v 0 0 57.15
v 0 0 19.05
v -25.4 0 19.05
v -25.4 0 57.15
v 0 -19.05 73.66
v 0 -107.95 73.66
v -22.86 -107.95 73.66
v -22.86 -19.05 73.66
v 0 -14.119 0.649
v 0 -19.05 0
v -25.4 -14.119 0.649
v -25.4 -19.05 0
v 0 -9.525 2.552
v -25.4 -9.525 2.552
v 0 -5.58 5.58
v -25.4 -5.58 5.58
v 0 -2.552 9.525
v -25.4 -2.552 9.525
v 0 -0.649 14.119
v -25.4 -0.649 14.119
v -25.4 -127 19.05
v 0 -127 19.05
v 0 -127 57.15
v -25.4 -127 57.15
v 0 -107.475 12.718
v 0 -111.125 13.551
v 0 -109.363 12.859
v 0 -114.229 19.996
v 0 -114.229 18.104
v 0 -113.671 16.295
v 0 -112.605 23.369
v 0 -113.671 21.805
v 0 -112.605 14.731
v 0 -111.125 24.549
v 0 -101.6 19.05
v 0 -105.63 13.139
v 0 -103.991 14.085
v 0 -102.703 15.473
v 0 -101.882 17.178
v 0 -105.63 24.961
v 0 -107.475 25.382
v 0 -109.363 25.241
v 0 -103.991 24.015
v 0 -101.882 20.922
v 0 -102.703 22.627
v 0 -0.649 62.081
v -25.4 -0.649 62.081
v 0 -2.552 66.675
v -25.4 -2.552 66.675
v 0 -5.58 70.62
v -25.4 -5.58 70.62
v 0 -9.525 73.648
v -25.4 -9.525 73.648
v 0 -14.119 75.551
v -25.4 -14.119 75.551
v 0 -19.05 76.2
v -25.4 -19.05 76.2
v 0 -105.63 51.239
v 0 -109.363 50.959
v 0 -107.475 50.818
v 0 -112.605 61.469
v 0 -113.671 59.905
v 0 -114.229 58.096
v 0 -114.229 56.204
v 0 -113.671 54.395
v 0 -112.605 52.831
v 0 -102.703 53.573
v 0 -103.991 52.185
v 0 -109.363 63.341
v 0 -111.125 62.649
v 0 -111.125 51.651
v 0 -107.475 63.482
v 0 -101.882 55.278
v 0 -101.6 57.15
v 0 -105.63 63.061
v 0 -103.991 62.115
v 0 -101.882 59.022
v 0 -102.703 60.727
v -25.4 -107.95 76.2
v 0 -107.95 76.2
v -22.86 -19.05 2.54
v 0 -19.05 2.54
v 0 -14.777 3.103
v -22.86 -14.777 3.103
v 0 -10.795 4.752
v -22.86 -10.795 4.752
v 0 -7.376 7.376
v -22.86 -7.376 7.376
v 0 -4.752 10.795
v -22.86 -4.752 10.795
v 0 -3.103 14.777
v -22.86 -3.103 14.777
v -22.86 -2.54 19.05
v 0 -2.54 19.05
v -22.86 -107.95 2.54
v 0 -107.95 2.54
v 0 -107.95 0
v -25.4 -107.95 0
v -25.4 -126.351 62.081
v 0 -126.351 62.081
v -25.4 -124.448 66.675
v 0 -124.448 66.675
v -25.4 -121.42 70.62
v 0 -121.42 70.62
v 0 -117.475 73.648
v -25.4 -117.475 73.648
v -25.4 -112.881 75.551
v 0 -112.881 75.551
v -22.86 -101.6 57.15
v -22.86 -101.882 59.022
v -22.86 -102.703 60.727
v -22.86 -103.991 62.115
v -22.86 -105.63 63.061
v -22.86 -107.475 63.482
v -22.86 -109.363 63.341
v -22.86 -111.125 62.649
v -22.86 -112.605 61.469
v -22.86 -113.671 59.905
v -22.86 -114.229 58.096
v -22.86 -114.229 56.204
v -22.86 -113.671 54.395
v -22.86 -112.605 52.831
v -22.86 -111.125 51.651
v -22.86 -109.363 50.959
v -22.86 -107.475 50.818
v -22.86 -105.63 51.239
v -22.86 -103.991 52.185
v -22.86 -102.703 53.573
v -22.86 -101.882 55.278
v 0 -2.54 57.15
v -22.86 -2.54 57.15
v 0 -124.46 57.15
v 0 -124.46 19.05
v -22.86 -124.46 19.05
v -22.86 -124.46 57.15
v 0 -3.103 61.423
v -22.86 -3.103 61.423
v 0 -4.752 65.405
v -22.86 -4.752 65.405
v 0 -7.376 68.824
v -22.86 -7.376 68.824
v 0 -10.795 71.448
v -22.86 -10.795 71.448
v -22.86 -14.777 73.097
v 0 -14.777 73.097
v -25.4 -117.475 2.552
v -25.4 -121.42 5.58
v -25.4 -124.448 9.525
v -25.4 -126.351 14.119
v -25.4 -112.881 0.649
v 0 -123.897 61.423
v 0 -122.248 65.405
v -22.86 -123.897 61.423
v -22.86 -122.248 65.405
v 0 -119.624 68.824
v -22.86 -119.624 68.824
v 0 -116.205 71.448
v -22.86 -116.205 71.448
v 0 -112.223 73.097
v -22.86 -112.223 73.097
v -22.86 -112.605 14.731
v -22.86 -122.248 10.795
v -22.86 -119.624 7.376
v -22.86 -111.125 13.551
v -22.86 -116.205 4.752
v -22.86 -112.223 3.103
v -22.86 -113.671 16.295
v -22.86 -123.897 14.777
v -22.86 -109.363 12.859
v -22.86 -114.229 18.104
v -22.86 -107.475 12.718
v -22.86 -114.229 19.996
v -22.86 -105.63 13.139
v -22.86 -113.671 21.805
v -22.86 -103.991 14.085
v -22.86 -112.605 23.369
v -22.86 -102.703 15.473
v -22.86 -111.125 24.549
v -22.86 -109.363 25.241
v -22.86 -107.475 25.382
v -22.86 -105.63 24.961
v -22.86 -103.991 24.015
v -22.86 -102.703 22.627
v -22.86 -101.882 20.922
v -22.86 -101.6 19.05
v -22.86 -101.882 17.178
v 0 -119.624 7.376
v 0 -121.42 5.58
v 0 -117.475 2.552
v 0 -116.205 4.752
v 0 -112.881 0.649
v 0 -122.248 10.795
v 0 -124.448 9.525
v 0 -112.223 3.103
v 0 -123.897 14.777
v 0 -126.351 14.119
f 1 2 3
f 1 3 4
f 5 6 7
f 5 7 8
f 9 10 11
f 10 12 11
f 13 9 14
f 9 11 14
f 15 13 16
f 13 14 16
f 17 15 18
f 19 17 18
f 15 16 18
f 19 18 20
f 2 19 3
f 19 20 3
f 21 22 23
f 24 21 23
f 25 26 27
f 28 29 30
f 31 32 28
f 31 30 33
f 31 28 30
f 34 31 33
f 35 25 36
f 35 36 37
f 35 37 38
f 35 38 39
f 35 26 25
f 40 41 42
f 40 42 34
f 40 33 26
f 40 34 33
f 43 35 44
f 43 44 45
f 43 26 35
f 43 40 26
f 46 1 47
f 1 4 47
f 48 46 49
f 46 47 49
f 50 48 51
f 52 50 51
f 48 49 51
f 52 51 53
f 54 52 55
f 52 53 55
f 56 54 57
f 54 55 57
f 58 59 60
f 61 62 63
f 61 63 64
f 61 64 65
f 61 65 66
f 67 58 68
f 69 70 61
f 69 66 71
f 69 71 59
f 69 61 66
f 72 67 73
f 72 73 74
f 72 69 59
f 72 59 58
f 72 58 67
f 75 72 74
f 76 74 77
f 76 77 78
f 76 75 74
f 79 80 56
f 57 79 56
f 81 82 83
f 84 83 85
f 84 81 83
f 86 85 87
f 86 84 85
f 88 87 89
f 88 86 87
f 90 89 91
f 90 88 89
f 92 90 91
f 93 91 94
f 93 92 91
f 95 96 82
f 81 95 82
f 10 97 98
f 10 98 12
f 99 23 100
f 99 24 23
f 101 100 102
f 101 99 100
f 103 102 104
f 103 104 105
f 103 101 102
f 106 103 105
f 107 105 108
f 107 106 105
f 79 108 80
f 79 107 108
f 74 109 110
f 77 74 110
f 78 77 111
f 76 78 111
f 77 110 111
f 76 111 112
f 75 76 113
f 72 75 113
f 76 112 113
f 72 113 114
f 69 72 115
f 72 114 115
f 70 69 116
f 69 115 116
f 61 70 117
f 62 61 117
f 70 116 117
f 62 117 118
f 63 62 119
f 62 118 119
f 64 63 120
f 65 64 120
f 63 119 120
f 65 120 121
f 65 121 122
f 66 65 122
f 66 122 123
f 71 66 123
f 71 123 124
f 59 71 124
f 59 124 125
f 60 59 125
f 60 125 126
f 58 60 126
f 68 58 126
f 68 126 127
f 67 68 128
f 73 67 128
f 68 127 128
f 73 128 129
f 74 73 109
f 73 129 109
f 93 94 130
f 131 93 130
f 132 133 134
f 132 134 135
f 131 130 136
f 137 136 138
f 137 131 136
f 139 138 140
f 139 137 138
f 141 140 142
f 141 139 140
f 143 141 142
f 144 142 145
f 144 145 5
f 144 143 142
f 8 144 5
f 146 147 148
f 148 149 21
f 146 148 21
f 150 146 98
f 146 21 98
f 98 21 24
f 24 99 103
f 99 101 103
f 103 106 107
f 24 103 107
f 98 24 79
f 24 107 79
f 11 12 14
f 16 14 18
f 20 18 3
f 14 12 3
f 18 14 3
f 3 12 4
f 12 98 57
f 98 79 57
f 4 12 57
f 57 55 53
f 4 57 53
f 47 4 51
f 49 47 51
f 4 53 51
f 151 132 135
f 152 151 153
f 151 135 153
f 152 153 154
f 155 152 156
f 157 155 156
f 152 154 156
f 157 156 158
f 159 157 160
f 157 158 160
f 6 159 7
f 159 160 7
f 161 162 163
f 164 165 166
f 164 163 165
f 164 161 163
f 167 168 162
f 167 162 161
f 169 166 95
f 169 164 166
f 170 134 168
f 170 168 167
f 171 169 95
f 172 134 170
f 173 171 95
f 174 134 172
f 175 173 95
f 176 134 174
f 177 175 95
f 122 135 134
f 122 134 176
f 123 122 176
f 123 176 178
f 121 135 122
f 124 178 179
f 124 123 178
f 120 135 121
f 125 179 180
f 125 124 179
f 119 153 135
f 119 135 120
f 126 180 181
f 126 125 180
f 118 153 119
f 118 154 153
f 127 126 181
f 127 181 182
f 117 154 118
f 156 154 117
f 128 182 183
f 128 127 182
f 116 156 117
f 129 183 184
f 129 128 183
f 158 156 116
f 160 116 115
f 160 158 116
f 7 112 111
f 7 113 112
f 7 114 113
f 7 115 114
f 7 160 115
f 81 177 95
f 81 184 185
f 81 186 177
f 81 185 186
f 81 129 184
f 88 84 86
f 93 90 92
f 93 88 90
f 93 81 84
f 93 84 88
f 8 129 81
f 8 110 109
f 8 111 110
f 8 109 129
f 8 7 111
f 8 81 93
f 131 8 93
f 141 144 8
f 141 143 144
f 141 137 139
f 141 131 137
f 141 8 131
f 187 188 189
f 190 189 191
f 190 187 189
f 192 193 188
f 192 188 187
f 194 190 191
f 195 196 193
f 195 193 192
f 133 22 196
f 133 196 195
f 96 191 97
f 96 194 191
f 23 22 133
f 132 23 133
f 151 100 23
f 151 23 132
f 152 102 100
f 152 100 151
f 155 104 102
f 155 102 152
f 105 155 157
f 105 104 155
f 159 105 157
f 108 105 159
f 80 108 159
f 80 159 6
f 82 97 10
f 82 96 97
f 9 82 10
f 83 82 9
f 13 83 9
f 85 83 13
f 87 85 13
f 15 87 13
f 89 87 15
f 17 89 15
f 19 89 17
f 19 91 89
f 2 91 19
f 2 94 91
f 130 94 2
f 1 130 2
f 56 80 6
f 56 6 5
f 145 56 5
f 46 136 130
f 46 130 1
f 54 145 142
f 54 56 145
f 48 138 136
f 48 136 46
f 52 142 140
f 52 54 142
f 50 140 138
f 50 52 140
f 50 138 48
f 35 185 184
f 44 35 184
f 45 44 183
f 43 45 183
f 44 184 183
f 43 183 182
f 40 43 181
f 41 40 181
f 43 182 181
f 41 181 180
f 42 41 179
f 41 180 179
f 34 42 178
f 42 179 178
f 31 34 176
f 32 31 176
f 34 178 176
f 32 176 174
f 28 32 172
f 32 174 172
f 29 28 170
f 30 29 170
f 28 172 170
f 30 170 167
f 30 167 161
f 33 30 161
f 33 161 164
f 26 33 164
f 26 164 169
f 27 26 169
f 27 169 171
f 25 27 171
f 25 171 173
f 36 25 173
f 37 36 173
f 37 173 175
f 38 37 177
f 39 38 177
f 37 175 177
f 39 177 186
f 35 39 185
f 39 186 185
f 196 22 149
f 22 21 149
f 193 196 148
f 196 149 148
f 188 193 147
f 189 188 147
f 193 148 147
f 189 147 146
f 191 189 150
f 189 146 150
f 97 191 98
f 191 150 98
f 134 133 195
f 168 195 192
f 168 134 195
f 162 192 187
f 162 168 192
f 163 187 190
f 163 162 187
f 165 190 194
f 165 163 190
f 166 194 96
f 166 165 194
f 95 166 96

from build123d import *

# Parameters (mm, degrees)
F0_W     = 127
F0_H     = 76.2
F1_DEPTH = 25.4
F2_R     = 19.05
F3_T     = -2.54
F4_R     = 6.35
F5_DEPTH = 22.86


with BuildPart() as f1:
    # F0 (on Right) → F1 (new body)
    with BuildSketch(Plane.YZ):
        with Locations((-63.5, 38.1)):
            Rectangle(F0_W, F0_H)
    extrude(amount=-F1_DEPTH)

    # F2
    f2_edges = [f1.edges().sort_by_distance(p)[0] for p in [
        (-12.7, -127, 76.2),
        (-12.7, -127, 0),
        (-12.7, 0, 76.2),
        (-12.7, 0, 0),
    ]]
    fillet(f2_edges, radius=F2_R)

    # F3
    f3_openings = [f1.faces().sort_by_distance(p)[0] for p in [
        (0, -63.5, 38.1),
    ]]
    offset(amount=F3_T, openings=f3_openings)

    # F4 (on face) → F5 (join, through all)
    with BuildSketch(Plane.YZ.offset(-22.86)):
        with Locations((-107.95, 57.15)):
            Circle(F4_R)
        with Locations((-107.95, 19.05)):
            Circle(F4_R)
    extrude(amount=F5_DEPTH)


solid = f1.part
